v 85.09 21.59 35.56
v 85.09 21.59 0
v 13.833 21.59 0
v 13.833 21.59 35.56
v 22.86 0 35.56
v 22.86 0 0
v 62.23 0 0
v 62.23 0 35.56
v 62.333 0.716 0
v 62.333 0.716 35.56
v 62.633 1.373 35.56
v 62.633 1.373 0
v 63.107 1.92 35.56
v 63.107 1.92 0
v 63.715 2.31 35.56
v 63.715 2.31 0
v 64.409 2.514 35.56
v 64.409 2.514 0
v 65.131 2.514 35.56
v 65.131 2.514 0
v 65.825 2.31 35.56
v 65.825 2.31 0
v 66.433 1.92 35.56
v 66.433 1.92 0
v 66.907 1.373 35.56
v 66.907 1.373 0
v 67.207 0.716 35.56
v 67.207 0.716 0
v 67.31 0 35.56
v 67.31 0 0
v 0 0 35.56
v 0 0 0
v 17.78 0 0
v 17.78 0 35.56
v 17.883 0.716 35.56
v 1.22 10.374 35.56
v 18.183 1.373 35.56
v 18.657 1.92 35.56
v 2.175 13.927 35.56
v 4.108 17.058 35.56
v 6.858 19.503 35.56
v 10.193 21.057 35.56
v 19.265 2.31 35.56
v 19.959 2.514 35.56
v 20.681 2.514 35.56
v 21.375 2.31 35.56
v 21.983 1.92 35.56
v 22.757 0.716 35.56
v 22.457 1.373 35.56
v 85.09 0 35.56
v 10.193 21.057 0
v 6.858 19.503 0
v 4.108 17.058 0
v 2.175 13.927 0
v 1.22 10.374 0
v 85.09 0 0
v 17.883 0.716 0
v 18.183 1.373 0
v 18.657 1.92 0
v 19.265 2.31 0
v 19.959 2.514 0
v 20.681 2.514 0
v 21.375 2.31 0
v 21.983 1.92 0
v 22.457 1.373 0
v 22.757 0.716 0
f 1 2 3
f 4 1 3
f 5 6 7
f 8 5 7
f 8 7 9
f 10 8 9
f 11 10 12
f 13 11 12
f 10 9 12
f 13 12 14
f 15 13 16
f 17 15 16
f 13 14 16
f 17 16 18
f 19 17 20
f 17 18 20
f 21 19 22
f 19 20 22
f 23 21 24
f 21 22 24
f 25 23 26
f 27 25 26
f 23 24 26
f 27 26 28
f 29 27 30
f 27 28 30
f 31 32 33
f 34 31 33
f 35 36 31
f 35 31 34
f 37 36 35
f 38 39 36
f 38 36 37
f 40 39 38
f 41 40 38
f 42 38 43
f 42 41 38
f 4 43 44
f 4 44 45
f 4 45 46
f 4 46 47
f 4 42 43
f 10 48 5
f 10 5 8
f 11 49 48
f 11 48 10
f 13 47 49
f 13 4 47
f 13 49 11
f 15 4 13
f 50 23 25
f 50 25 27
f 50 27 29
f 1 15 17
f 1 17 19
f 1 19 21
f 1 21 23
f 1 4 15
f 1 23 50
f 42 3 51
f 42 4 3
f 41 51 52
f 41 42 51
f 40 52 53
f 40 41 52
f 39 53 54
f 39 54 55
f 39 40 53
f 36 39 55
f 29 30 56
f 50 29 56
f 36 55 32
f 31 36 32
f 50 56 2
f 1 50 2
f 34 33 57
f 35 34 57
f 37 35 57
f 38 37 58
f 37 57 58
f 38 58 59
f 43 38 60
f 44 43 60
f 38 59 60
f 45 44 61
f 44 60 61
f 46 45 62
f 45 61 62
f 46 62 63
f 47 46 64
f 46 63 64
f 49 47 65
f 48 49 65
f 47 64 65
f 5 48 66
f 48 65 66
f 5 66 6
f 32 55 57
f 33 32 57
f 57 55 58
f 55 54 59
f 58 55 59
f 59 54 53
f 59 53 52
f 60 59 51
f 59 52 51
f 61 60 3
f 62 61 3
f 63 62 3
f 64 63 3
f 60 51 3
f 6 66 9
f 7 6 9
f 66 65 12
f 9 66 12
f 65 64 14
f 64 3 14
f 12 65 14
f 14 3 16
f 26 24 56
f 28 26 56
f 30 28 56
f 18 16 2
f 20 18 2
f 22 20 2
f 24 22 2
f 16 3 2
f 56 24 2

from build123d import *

# Parameters (mm, degrees)
BOSS_EXTRUDE1_DEPTH = 35.56
FILLET1_R           = 12.7


with BuildPart() as part:
    # Sketch1 → Boss-Extrude1 (new body)
    with BuildSketch(Plane.XY):
        with BuildLine():
            Line((85.09, 0), (85.09, 21.59))
            Line((85.09, 21.59), (2.54, 21.59))
            Line((2.54, 21.59), (0, 0))
            Line((0, 0), (17.78, 0))
            ThreePointArc((17.78, 0), (20.32, 2.54), (22.86, 0))
            Line((22.86, 0), (62.23, 0))
            ThreePointArc((62.23, 0), (64.77, 2.54), (67.31, 0))
            Line((67.31, 0), (85.09, 0))
        make_face()
    extrude(amount=BOSS_EXTRUDE1_DEPTH)

    # Fillet1
    fillet1_edges = [part.edges().sort_by_distance(p)[0] for p in [
        (2.54, 21.59, 17.78),
    ]]
    fillet(fillet1_edges, radius=FILLET1_R)


solid = part.part
